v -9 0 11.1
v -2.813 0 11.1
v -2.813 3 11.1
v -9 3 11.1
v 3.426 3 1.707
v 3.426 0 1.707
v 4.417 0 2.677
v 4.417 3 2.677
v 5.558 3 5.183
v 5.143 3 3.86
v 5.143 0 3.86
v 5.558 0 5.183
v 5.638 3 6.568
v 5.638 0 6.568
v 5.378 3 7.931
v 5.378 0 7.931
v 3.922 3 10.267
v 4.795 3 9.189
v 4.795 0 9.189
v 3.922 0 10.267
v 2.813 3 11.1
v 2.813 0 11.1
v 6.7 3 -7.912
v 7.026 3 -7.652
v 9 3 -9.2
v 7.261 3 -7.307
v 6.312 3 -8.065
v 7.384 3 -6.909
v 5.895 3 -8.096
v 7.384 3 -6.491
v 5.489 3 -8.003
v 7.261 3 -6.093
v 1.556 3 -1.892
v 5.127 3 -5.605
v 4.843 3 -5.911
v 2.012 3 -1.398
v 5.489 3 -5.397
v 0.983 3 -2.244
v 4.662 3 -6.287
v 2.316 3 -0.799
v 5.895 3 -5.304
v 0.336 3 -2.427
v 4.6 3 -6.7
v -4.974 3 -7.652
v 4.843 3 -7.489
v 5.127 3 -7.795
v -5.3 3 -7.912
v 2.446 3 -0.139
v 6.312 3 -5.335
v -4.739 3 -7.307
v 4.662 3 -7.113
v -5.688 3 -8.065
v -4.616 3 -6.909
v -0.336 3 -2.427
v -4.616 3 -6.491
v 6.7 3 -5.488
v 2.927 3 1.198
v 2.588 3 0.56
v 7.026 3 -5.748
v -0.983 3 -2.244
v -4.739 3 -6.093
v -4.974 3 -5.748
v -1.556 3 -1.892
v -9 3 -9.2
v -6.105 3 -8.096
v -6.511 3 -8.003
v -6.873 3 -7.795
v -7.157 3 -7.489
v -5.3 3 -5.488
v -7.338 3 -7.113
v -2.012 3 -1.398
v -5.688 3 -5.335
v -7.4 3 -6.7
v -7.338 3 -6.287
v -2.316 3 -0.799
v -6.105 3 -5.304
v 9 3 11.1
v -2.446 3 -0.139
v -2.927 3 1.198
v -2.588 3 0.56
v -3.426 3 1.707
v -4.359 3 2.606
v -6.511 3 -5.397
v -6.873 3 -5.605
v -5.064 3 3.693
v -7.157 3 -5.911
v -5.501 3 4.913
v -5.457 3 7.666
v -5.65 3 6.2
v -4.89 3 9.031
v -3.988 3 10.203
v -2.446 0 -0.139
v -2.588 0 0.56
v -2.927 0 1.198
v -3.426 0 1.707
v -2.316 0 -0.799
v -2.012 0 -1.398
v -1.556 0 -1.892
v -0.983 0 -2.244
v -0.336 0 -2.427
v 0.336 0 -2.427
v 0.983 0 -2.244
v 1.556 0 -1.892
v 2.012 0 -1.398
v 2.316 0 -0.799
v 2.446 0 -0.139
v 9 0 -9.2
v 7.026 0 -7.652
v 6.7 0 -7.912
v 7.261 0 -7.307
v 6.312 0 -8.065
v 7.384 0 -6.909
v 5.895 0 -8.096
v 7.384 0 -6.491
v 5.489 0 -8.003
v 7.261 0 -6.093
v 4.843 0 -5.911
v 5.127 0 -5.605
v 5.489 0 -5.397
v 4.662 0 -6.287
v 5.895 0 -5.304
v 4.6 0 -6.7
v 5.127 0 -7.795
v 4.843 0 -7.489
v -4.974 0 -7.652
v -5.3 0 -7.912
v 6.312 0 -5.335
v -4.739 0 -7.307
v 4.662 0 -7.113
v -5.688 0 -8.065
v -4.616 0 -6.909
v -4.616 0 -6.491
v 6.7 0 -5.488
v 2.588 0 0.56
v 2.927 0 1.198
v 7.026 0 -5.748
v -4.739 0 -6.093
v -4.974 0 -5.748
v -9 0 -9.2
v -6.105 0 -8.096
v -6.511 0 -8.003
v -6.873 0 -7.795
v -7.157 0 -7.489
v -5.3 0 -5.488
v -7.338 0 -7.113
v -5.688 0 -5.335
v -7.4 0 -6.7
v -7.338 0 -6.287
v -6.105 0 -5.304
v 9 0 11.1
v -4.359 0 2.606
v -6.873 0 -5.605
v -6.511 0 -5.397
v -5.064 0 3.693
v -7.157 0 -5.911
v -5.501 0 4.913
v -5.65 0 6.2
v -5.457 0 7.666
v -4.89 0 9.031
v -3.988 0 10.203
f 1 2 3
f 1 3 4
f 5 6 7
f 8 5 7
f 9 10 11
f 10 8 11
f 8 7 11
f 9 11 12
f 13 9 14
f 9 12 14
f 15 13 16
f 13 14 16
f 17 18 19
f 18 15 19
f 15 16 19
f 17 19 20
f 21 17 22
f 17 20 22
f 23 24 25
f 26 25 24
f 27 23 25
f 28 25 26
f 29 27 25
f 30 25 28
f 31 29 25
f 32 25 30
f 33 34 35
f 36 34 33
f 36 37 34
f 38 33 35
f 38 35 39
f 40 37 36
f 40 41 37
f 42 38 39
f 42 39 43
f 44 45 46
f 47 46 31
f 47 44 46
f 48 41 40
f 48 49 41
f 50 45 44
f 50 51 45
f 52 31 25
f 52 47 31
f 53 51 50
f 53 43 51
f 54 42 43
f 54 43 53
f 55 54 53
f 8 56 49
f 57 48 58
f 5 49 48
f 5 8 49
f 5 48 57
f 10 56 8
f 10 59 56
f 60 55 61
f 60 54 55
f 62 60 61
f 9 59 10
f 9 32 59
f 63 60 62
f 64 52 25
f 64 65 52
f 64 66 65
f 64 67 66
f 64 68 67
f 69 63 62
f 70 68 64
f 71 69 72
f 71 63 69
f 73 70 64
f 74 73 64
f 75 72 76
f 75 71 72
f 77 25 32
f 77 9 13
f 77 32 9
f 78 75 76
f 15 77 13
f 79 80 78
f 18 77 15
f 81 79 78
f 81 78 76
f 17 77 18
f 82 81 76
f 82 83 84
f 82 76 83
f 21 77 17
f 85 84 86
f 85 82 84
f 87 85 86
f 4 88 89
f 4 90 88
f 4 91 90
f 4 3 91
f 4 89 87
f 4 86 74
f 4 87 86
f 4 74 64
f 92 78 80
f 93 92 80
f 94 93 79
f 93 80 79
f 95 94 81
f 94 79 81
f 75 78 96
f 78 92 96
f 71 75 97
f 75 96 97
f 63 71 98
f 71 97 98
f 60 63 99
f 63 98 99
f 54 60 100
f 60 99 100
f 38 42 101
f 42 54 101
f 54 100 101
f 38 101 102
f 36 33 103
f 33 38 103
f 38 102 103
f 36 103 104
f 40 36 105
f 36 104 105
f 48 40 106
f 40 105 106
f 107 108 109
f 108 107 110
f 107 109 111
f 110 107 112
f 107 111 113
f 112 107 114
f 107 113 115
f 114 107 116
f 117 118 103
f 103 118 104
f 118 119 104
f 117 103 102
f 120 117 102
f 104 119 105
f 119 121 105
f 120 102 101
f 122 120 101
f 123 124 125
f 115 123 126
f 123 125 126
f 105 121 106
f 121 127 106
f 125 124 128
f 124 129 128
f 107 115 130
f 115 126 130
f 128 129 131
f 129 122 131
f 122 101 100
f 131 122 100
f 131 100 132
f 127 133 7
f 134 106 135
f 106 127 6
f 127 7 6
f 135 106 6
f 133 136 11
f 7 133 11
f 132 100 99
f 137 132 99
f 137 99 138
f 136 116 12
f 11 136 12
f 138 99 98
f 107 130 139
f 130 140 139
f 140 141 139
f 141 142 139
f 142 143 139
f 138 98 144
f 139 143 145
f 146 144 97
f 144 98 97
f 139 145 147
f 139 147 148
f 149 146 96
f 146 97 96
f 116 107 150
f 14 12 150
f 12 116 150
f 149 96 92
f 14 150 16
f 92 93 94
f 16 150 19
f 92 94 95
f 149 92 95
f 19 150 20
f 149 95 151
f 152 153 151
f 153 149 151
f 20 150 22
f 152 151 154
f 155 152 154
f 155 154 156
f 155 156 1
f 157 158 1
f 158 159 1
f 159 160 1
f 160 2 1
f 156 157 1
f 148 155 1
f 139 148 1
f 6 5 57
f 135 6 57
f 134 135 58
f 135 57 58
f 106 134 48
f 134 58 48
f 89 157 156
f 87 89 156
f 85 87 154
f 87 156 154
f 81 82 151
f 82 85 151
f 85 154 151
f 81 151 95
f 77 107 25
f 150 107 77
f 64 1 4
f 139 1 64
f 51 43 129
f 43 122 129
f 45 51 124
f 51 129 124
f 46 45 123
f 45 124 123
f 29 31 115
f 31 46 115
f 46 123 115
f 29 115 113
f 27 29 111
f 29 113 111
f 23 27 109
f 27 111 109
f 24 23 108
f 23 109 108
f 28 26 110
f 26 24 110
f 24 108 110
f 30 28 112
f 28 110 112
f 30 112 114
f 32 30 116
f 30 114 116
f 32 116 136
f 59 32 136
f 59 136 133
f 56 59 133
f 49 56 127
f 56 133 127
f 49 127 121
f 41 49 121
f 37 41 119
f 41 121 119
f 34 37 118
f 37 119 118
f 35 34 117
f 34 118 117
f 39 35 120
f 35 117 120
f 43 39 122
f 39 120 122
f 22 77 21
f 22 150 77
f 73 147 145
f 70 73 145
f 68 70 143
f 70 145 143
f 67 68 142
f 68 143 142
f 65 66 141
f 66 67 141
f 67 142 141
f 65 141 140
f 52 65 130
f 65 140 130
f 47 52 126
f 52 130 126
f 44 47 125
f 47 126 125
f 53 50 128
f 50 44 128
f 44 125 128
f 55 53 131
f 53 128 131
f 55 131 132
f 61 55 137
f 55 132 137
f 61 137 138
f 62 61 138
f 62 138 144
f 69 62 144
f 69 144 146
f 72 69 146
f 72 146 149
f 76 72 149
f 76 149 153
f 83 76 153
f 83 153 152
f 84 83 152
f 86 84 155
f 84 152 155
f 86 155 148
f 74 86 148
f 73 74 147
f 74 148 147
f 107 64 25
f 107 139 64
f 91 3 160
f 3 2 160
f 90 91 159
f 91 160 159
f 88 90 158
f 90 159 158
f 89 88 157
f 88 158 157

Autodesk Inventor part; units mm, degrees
ref_plane "YZ Plane" through (0, 0, 0) normal (1, 0, 0) x (0, 1, 0)
ref_plane "XZ Plane" through (0, 0, 0) normal (0, 1, 0) x (-1, 0, 0)
ref_plane "XY Plane" through (0, 0, 0) normal (0, 0, 1) x (1, 0, 0)
sketch "Sketch2" plane through (0, 0, 0) normal (0, 1, 0) x (-1, 0, 0)
  circle A0 centre (0, 0) radius 2.45
  circle A1 centre (0, 6.2) radius 5.65
  line L0 (9, -9.2) -> (-9, -9.2)
  line L1 (-9, -9.2) -> (-9, 11.1)
  line L2 (-9, 11.1) -> (9, 11.1)
  line L3 (9, 11.1) -> (9, -9.2)
  circle A2 centre (6, -6.7) radius 1.4
  line L4 (0, 0) -> (0, -9.2) construction
  circle A3 centre (-6, -6.7) radius 1.4
  point P0 (2.8129, 11.1)
  point P1 (2.2323, 1.0097)
  point P2 (-2.2323, 1.0097)
  point P3 (-2.8129, 11.1)
  dimension "d20" = 4.9
  dimension "d21" = 11.3
  dimension "d22" = 6.2
  dimension "d23" = 4.9
  dimension "d24" = 18
  dimension "d25" = 20.3
  dimension "d26" = 2.8
  dimension "d27" = 2.5
  dimension "d28" = 3
extrude "Extrusion1" add sketch "Sketch2" along normal blind 3 contours A0 A1 L2 L3 L0 L1
fillet "Fillet1" radius 2.5 2 edges at (-2.2323, 1.5, 1.0097) (2.2323, 1.5, 1.0097)
properties part number "sujetador_cremallera"
